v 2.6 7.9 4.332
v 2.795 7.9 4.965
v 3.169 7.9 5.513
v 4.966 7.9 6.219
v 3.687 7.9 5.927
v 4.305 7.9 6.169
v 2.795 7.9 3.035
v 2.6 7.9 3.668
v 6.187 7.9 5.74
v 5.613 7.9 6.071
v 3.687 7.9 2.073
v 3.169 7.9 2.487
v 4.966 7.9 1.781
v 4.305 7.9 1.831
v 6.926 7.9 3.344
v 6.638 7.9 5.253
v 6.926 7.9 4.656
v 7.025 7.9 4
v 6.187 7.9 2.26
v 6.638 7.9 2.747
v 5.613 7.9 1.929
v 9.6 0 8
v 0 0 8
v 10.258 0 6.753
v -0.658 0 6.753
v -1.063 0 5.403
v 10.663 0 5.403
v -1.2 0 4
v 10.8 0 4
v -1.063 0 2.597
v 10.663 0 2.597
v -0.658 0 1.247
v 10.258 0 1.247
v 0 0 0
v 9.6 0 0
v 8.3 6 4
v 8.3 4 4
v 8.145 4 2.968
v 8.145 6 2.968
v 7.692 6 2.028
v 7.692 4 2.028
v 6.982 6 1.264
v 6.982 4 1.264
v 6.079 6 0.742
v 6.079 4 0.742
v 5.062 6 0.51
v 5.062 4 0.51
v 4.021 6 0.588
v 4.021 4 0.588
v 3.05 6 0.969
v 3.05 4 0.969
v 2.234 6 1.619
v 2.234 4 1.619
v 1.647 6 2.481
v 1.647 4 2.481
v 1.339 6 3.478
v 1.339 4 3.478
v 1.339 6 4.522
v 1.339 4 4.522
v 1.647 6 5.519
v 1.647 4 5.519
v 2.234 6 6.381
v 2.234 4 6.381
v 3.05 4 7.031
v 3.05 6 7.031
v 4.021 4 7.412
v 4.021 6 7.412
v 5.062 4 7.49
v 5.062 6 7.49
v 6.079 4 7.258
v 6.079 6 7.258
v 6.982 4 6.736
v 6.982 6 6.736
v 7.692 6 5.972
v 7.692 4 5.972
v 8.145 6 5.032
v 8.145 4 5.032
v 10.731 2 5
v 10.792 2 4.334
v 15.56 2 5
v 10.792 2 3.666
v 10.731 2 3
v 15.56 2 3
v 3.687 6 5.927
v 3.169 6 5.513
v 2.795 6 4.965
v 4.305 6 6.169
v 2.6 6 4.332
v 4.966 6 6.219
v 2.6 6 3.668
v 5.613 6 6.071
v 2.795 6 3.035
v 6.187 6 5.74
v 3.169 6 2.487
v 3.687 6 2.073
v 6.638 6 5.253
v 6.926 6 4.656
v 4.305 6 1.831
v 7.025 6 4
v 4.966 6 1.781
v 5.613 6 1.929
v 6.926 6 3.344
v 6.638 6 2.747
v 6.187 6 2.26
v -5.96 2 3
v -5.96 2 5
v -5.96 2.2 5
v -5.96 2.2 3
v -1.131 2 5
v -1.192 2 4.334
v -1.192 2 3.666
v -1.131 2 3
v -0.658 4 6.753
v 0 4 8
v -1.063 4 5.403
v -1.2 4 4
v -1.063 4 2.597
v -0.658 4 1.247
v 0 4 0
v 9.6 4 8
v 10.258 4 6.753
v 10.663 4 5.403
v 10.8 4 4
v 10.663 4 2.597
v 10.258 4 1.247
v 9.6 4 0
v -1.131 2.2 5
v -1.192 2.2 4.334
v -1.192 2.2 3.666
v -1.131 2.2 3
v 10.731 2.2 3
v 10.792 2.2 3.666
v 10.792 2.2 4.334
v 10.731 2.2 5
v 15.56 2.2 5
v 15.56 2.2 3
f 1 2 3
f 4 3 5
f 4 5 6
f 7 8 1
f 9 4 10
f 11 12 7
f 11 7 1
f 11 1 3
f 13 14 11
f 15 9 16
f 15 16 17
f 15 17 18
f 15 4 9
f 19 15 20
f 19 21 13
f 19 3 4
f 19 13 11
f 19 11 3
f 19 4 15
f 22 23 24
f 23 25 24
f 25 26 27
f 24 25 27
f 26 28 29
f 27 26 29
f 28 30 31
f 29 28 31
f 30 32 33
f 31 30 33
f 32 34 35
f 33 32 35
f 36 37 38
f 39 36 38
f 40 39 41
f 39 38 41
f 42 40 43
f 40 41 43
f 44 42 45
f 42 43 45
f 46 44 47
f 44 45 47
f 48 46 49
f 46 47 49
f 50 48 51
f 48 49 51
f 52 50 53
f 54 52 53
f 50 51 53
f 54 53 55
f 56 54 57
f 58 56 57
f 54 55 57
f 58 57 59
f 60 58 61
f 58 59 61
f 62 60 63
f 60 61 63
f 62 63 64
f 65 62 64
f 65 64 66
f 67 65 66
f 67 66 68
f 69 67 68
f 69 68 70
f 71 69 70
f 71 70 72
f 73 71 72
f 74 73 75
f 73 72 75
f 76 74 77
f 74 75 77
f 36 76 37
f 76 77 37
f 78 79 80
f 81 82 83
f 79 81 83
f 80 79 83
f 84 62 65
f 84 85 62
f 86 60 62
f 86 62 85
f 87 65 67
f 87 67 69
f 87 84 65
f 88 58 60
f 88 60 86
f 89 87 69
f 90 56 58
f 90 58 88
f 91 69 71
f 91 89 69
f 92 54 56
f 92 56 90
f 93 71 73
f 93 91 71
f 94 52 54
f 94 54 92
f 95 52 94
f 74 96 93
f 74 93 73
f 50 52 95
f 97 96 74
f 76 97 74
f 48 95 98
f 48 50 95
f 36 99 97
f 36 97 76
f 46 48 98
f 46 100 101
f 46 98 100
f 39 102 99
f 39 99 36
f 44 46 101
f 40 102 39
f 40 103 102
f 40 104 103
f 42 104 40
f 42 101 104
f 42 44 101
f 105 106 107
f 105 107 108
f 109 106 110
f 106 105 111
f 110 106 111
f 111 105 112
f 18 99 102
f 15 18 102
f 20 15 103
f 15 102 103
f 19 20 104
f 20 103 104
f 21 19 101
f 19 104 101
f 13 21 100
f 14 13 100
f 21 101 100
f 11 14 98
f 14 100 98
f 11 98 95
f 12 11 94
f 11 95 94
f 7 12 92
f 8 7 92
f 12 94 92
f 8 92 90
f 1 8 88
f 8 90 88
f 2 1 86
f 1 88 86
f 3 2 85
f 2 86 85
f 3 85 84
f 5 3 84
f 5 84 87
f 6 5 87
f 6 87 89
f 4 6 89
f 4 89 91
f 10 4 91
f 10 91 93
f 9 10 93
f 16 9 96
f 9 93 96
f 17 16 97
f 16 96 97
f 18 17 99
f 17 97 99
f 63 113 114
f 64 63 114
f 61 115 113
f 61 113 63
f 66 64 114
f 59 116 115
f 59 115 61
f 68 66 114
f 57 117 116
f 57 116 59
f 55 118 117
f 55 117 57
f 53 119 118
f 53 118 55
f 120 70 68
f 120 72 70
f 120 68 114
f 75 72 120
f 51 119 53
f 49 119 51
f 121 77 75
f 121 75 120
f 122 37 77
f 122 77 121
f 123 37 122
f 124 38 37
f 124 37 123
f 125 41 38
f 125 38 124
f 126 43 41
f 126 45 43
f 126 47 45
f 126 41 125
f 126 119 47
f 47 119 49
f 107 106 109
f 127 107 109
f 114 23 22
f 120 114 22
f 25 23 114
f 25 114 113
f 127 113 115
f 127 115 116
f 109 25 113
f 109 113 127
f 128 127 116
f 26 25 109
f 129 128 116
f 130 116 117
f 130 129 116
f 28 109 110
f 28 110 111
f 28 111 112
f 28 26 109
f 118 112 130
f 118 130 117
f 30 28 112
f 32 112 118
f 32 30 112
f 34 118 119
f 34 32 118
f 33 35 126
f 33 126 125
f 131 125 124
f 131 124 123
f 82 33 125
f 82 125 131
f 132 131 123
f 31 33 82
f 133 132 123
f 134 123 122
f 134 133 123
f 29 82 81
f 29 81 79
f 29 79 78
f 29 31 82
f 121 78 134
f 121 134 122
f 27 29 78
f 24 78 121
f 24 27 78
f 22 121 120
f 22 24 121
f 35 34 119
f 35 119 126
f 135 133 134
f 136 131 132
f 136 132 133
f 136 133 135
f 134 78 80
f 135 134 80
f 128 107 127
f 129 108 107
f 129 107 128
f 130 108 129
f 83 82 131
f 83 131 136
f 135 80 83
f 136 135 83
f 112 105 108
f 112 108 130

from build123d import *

# Parameters (mm, degrees)
SKETCH1_W           = 9.6
SKETCH1_H           = 8
BOSS_EXTRUDE1_DEPTH = 4
SKETCH2_R           = 3.5
BOSS_EXTRUDE2_DEPTH = 2
SKETCH3_R           = 2.225
BOSS_EXTRUDE3_DEPTH = 1.9
BOSS_EXTRUDE4_START = -2
SKETCH4_W           = 5.092025843
SKETCH4_H           = 2
BOSS_EXTRUDE4_DEPTH = 0.2


with BuildPart() as part:
    # Sketch1 → Boss-Extrude1 (new body)
    with BuildSketch(Plane(origin=(0, 0, 0), x_dir=(1, 0, 0), z_dir=(0, 1, 0))):
        with Locations((4.8, -4)):
            Rectangle(SKETCH1_W, SKETCH1_H)
        with BuildLine():
            Line((0, 0), (0, -8))
            ThreePointArc((0, -8), (-1.2, -4), (0, 0))
        make_face()
        with BuildLine():
            ThreePointArc((9.6, 0), (10.8, -4), (9.6, -8))
            Line((9.6, -8), (9.6, 0))
        make_face()
    extrude(amount=BOSS_EXTRUDE1_DEPTH)

    # Sketch2 → Boss-Extrude2 (add)
    with BuildSketch(Plane(origin=(0, 4, 0), x_dir=(1, 0, 0), z_dir=(0, 1, 0))):
        with Locations((4.8, -4)):
            Circle(SKETCH2_R)
    extrude(amount=BOSS_EXTRUDE2_DEPTH)

    # Sketch3 → Boss-Extrude3 (add)
    with BuildSketch(Plane(origin=(0, 6, 0), x_dir=(1, 0, 0), z_dir=(0, 1, 0))):
        with Locations((4.8, -4)):
            Circle(SKETCH3_R)
    extrude(amount=BOSS_EXTRUDE3_DEPTH)

    # Sketch4 → Boss-Extrude4 (add)
    with BuildSketch(Plane(origin=(0, 4, 0), x_dir=(1, 0, 0), z_dir=(0, 1, 0)).offset(BOSS_EXTRUDE4_START)):
        with Locations((-3.414000557, -4)):
            Rectangle(SKETCH4_W, SKETCH4_H)
        with Locations((13.014000557, -4)):
            Rectangle(SKETCH4_W, SKETCH4_H)
    extrude(amount=BOSS_EXTRUDE4_DEPTH)


solid = part.part
